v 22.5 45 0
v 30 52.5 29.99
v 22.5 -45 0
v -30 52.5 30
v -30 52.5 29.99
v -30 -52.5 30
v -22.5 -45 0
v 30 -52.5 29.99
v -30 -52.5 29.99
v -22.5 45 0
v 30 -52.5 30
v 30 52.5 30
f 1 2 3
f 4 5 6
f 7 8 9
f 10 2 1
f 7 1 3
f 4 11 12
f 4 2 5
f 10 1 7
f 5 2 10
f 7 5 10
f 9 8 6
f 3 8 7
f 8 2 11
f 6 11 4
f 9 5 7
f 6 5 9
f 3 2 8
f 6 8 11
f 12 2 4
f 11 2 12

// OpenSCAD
// file: config.scad
e = 0.01;

// Real Sterilite Tote Size
//toteHeight = 125;
//toteTopWidth = 200;
//toteBottomWidth = 155;
//toteTopLength = 355;
//toteBottomLength = 300;

// Scaled Size
toteHeight = 30;
toteTopWidth = 60;
toteBottomWidth = 45;
toteTopLength = 105;
toteBottomLength = 90;

// Parameters
fingerHeight = 5;
fingerClearance = 5;

armatureHeight = 10;
armatureThickness = 20;

baseHeight = 20;
baseThickness = 10;

boltDiameter = 3;
pinDiameter = 4;

base2Height = 20;

totesPerRow = 3;
// main file
include <config.scad>;

module tote() {
  hull() {
    translate([0, 0, toteHeight/2])
      cube([toteBottomWidth, toteBottomLength, toteHeight], center = true);
    translate([0, 0, toteHeight -e/2])
      cube([toteTopWidth, toteTopLength, e], center = true);
  }
}

module totes() {
  for (x = [0:(totesPerRow-1)])
    translate([-x*toteTopWidth, 0, 0])
      scale(0.99)
        tote();
}

tote();
